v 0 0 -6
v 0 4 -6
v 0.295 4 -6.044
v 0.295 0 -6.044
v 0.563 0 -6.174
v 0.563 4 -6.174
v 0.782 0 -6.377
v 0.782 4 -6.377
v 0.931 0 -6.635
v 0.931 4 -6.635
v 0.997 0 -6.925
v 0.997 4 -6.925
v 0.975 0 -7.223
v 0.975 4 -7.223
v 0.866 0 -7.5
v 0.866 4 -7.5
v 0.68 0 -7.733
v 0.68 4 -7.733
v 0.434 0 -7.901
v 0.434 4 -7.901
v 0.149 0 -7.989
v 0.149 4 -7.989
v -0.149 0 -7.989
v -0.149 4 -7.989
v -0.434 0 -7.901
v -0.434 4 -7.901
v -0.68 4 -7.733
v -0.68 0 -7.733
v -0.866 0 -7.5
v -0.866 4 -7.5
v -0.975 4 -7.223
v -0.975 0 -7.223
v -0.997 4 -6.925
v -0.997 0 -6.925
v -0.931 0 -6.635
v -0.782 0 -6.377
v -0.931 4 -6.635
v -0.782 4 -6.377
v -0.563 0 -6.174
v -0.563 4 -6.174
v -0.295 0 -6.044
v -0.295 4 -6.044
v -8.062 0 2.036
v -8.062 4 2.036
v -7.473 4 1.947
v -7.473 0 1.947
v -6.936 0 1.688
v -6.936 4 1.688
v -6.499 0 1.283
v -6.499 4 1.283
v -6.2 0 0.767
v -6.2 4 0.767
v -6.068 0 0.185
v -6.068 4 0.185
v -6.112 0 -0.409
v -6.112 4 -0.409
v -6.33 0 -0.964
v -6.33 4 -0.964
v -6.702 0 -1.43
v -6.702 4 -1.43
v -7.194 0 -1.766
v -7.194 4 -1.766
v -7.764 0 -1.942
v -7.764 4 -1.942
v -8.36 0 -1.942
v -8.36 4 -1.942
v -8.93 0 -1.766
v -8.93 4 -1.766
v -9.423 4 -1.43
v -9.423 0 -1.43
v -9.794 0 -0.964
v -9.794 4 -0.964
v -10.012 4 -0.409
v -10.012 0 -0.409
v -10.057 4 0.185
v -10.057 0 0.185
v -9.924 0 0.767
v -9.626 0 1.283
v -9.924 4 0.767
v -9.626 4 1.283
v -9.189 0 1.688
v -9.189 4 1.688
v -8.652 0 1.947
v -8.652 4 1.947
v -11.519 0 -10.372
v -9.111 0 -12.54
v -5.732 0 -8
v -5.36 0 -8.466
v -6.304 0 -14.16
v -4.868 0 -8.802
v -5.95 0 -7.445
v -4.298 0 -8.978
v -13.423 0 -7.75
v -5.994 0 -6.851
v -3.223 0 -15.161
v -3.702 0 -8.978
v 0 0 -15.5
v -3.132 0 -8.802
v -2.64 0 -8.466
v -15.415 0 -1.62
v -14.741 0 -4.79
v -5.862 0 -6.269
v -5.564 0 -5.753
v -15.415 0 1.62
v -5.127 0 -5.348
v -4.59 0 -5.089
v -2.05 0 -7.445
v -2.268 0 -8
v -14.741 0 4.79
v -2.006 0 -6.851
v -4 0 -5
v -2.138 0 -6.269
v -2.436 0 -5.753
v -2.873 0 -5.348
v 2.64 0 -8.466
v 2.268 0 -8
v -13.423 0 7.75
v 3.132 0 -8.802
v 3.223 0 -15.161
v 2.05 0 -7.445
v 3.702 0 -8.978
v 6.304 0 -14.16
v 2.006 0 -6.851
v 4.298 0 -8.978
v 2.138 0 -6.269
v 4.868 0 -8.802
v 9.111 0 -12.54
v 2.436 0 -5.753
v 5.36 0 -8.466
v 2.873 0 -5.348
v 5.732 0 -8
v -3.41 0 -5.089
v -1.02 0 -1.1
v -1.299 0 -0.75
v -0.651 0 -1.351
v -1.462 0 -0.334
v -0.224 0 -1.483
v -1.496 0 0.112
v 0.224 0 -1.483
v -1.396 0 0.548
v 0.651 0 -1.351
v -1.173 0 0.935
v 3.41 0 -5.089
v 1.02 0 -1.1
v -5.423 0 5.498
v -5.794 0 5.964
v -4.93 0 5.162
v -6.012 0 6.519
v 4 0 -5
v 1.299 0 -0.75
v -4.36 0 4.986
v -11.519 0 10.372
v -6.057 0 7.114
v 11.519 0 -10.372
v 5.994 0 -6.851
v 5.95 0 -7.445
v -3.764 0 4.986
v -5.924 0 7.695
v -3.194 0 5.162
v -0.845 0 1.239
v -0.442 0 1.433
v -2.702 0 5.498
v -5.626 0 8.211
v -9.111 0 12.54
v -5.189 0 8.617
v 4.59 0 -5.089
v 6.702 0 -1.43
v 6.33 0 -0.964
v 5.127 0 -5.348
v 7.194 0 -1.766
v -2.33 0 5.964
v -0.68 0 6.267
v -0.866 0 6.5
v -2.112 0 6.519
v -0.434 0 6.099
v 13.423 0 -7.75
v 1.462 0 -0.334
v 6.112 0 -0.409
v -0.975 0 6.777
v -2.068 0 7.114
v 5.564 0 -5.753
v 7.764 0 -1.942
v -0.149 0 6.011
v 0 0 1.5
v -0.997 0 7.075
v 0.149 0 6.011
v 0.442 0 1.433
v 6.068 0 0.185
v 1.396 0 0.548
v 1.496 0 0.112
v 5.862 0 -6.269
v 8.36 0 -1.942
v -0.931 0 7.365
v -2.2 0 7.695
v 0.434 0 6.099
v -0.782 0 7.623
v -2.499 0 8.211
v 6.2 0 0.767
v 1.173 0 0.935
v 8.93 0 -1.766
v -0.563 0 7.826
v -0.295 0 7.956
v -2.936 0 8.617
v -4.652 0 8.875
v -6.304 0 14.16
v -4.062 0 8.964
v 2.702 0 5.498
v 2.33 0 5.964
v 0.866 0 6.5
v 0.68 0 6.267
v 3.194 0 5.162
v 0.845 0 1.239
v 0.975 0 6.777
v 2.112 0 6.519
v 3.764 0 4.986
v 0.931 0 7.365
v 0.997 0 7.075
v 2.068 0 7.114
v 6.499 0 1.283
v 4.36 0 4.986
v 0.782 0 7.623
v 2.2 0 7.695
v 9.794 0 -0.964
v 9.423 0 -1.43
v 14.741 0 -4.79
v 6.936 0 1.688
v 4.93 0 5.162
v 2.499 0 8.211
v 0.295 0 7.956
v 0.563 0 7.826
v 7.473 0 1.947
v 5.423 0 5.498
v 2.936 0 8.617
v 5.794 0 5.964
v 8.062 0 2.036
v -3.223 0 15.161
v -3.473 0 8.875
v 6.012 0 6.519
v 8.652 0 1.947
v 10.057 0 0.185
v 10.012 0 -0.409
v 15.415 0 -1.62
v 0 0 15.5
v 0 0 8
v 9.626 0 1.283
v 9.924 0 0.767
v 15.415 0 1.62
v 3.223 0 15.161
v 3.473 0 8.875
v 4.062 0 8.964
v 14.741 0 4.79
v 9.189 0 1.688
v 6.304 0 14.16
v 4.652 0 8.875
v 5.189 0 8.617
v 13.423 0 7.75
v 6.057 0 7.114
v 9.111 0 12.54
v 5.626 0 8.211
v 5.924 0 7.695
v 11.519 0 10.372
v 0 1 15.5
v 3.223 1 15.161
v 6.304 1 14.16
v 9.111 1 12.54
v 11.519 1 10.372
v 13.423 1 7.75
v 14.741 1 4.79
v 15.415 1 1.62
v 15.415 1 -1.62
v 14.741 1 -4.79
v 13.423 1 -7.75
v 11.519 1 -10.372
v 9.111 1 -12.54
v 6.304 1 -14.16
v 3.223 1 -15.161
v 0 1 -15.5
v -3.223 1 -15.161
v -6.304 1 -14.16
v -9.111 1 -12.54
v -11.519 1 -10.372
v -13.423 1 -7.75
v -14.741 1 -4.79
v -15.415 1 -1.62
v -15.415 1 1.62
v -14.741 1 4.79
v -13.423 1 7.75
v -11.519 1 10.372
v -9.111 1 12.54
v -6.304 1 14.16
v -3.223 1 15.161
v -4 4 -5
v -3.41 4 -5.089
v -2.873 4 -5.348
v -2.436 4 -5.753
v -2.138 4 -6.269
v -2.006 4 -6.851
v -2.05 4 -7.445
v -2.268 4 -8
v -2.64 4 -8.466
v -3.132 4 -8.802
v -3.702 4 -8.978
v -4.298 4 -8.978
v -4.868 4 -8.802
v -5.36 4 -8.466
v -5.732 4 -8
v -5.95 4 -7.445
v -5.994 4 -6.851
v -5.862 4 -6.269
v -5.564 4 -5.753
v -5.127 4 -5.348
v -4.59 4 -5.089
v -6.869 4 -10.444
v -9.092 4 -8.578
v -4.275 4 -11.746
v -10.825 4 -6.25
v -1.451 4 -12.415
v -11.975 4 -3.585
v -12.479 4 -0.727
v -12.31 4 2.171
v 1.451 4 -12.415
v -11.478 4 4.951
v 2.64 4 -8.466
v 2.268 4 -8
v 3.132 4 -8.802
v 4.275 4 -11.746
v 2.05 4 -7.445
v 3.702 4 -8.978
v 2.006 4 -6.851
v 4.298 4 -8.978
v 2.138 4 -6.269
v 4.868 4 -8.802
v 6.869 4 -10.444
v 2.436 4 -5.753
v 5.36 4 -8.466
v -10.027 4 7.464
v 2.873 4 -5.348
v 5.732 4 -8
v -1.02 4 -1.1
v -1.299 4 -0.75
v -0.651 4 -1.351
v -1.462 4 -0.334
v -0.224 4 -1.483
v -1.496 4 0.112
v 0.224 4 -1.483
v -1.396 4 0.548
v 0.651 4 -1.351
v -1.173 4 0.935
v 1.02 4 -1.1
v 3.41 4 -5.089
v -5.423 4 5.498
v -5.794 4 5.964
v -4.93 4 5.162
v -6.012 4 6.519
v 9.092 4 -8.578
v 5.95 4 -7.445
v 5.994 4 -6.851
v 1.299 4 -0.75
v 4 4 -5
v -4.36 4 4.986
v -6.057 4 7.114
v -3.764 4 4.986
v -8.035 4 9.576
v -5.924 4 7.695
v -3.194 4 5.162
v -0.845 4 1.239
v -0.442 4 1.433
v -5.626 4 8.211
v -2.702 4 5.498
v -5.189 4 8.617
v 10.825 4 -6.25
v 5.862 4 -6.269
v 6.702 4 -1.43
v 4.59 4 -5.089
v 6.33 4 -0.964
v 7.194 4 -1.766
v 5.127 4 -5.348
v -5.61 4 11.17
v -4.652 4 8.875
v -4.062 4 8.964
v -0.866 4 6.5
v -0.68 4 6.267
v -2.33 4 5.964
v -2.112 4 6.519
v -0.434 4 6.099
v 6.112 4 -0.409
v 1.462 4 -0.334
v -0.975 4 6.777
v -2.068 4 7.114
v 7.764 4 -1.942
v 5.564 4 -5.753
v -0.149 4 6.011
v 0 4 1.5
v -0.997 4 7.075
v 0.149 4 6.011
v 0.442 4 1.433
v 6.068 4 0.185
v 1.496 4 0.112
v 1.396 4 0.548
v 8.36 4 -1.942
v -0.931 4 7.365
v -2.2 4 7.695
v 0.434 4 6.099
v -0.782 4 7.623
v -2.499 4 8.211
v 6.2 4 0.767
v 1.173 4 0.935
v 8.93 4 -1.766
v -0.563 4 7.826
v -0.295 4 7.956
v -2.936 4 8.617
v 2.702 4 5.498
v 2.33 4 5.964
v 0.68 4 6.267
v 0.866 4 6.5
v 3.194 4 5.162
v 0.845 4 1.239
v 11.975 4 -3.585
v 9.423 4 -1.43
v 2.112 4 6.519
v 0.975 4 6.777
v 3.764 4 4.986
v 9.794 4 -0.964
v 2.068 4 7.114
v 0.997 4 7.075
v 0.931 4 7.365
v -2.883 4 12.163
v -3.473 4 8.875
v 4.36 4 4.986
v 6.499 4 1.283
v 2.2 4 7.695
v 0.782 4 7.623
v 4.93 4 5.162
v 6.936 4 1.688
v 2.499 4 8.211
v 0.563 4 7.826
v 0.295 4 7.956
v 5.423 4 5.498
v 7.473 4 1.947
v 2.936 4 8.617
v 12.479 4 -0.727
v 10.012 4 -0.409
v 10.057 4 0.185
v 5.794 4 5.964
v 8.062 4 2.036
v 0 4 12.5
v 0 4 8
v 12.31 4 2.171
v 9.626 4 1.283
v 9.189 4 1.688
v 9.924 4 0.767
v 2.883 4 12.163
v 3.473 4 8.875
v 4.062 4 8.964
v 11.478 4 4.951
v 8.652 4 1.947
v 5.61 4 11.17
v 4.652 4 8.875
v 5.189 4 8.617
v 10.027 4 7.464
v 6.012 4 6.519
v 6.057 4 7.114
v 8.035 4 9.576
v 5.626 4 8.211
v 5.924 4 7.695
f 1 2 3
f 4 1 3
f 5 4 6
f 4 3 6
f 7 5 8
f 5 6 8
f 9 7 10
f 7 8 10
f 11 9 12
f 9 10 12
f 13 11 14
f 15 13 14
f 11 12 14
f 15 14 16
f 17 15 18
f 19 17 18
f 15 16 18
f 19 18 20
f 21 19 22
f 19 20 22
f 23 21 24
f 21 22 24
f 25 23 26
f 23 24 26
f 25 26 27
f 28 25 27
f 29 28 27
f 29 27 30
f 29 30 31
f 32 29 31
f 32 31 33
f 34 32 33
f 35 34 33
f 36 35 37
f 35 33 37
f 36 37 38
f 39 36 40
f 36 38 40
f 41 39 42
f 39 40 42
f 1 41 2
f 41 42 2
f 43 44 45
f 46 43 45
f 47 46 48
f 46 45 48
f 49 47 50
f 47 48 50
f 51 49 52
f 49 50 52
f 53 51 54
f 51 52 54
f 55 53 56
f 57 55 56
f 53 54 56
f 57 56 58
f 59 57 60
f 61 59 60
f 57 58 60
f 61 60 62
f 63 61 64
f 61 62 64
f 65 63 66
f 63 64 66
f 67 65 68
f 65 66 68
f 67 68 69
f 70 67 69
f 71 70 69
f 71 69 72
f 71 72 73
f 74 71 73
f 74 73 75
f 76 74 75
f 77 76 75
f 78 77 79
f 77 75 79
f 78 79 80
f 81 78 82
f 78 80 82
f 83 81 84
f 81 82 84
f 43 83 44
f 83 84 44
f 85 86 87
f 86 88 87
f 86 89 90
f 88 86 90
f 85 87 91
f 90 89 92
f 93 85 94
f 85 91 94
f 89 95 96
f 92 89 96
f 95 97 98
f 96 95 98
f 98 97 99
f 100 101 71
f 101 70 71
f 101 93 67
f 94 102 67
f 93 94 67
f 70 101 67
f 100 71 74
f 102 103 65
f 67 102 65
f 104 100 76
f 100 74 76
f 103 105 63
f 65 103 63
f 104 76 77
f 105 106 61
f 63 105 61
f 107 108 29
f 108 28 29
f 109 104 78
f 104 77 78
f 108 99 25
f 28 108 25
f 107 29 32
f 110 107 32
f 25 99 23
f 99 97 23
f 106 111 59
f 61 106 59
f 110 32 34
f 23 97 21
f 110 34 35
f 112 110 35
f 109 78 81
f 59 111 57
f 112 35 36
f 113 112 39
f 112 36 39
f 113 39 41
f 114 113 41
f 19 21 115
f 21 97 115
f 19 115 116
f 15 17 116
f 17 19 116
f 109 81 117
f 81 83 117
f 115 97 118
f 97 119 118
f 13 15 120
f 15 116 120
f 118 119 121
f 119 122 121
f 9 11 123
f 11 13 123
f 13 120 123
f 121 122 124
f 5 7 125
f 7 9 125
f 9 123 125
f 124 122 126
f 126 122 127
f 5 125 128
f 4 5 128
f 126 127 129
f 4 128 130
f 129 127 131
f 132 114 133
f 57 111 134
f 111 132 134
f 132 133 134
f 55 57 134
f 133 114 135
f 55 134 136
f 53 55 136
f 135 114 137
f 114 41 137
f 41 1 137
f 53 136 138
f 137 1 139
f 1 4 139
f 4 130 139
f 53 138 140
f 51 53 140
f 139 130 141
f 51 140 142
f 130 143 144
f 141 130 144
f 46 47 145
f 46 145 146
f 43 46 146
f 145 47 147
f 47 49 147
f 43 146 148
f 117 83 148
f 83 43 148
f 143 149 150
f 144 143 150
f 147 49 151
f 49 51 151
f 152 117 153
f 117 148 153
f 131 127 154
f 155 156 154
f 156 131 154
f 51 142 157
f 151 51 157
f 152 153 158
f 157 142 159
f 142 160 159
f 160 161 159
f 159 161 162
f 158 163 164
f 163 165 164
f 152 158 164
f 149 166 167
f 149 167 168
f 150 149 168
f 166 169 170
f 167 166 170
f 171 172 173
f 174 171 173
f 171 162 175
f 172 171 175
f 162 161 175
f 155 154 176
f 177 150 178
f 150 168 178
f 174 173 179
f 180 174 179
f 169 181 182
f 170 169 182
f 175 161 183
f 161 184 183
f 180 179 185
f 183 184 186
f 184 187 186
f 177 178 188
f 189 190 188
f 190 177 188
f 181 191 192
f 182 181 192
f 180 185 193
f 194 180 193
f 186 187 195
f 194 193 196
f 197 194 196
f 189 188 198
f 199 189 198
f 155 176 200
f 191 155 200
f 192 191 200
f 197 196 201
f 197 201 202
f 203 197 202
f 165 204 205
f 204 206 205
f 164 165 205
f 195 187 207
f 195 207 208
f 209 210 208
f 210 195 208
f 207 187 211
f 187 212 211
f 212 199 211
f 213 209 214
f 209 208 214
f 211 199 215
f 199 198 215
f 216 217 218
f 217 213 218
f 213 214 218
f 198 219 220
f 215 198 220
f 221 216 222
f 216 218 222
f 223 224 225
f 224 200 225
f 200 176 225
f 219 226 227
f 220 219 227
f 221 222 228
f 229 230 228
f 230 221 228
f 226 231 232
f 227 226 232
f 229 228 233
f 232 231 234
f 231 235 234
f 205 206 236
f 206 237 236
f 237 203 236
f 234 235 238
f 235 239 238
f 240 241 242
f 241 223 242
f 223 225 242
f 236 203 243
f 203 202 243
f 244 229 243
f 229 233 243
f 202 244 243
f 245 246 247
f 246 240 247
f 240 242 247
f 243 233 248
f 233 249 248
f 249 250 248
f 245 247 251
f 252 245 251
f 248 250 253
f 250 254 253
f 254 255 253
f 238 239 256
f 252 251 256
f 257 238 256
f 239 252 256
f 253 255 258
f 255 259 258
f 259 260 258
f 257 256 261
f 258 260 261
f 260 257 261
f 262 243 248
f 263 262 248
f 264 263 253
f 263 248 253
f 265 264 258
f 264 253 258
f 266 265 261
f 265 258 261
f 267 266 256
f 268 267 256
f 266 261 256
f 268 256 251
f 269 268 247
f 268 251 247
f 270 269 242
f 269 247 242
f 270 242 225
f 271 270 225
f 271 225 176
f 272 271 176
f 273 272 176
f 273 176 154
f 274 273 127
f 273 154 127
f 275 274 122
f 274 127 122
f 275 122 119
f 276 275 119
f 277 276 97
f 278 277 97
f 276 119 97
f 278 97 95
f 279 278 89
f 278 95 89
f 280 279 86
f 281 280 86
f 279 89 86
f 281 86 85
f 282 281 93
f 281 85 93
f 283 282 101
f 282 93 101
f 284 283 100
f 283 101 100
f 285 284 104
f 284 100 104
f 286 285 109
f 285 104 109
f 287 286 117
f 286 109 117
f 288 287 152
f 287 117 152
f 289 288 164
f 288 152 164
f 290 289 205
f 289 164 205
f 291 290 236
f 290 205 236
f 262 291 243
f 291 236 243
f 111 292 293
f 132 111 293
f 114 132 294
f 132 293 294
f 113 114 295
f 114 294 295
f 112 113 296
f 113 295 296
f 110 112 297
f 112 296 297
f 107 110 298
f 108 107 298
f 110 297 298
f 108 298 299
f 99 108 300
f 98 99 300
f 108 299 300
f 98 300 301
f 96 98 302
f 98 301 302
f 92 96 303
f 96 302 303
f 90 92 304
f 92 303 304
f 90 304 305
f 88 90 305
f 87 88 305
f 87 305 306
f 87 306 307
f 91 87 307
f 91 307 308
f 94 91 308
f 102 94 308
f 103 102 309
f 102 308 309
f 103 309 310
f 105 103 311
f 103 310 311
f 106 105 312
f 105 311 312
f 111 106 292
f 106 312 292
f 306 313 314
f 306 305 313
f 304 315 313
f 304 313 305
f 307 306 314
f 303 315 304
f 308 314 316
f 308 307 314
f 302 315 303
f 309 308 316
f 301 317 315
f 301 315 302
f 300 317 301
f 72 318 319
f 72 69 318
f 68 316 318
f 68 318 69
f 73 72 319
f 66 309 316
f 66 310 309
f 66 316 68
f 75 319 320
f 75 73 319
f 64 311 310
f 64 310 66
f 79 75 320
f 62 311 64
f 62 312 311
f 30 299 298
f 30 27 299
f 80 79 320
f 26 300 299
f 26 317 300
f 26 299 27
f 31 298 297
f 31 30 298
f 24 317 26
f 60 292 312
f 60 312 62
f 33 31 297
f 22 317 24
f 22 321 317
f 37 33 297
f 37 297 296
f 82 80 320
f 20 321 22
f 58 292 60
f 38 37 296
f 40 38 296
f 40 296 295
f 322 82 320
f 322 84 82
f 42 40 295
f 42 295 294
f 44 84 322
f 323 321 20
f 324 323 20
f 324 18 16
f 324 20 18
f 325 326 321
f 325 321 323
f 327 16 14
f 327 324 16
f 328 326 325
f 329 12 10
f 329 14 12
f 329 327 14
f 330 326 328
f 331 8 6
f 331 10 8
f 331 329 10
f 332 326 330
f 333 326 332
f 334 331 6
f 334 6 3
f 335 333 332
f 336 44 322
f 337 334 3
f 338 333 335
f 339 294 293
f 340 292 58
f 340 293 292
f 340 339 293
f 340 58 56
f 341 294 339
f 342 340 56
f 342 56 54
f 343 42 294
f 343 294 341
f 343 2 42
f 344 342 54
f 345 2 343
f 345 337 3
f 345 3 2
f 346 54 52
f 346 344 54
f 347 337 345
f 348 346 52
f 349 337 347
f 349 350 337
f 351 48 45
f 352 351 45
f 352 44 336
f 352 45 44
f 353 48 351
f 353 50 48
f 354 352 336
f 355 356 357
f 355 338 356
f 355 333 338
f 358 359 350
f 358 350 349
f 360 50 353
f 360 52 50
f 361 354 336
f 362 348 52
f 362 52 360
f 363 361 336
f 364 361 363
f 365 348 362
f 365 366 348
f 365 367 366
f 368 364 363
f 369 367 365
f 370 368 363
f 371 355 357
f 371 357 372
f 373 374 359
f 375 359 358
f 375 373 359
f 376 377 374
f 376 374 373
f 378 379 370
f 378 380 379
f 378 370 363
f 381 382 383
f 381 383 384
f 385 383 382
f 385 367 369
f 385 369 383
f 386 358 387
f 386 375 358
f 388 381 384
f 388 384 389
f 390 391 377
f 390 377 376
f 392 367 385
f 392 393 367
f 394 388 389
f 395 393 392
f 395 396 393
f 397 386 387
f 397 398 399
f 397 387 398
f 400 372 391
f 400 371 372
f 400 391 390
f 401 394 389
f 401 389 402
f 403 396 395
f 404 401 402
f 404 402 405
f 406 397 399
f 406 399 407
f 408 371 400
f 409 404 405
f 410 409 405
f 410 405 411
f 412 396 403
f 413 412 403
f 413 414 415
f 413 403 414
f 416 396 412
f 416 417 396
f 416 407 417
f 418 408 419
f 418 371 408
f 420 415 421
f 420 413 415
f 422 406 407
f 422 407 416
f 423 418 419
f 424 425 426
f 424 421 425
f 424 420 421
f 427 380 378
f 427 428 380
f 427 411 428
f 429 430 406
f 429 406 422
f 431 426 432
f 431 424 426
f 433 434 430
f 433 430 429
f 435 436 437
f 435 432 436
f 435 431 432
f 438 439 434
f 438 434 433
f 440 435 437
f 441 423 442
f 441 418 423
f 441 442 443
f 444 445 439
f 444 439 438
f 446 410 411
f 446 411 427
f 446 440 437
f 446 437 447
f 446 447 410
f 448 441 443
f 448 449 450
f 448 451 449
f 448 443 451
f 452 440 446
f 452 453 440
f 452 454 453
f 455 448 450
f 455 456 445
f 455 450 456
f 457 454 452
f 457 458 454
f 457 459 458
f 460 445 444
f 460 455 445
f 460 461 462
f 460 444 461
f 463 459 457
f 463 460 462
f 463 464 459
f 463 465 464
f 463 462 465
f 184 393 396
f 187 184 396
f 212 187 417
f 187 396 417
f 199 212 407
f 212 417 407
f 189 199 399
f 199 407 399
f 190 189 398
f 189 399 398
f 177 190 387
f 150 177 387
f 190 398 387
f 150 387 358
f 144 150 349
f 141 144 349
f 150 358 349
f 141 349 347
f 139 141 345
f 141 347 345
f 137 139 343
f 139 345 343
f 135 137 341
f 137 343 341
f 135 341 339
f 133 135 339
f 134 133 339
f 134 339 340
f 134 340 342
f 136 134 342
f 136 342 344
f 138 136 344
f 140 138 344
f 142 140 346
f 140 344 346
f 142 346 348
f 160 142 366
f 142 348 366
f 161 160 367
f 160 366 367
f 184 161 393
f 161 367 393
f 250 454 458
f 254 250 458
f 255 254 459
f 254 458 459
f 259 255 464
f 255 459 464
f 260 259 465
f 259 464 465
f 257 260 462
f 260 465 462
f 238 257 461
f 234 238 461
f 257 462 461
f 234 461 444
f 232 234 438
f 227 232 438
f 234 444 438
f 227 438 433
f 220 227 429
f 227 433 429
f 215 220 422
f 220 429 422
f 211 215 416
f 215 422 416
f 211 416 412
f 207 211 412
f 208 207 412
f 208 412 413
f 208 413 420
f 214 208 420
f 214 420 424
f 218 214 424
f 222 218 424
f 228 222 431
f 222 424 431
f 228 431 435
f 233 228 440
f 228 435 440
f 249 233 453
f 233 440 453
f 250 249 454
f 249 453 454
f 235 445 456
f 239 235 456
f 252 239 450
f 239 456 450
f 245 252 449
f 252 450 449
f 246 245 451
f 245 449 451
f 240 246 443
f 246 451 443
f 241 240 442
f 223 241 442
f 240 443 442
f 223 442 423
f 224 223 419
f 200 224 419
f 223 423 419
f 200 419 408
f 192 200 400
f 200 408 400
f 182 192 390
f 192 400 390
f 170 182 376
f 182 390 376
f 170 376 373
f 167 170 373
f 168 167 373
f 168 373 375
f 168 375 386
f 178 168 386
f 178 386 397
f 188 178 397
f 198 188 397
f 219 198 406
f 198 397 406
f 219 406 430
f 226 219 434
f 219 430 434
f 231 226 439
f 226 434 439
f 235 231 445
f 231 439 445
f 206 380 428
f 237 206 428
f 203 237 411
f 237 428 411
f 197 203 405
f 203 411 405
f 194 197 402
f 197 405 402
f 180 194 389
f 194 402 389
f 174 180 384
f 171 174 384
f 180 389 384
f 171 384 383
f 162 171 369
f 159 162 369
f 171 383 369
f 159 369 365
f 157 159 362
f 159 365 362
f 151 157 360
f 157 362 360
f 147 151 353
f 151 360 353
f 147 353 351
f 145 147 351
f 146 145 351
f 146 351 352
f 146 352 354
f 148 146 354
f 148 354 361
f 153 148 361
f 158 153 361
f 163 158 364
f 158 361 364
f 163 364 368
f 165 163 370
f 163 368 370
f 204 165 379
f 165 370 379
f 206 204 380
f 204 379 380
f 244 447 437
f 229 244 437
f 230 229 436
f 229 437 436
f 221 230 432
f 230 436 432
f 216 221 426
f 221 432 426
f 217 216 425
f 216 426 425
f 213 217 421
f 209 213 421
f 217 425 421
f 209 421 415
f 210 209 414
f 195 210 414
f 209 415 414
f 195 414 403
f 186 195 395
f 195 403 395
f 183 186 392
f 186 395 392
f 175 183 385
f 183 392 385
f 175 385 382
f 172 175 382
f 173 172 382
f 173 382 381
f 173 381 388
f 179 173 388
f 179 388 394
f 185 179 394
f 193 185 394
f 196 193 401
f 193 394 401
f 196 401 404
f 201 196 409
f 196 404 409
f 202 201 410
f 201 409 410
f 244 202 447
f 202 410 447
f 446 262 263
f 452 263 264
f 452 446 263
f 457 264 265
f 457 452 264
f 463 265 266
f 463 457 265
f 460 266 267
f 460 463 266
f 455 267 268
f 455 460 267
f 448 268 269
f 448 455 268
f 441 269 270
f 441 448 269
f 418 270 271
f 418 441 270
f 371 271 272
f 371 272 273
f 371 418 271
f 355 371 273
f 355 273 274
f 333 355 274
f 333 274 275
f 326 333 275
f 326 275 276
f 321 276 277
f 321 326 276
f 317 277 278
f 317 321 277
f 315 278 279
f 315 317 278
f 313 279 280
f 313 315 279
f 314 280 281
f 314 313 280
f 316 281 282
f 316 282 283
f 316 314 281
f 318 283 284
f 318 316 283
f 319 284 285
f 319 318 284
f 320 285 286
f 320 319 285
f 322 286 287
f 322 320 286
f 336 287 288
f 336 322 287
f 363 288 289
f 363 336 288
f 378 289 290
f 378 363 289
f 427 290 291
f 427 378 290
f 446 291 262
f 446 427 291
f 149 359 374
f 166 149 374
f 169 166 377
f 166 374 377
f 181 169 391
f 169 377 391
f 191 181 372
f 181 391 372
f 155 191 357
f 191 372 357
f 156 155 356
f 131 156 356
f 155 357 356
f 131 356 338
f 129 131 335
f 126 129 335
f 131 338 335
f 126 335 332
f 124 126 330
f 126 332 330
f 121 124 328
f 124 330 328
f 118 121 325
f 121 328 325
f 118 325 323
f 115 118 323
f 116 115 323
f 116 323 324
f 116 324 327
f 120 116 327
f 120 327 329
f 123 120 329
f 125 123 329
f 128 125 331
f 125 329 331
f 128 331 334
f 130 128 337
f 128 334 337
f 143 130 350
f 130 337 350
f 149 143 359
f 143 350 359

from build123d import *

# Parameters (mm, degrees)
SKETCH1_R           = 15.5
BOSS_EXTRUDE1_DEPTH = 4
CHAMFER1_SIZE       = 3
SKETCH2_R           = 2
CUT_EXTRUDE1_DEPTH  = 4
SKETCH3_R           = 1.5
CUT_EXTRUDE2_DEPTH  = 4
SKETCH4_R           = 1
CUT_EXTRUDE3_DEPTH  = 4


with BuildPart() as part:
    # Sketch1 → Boss-Extrude1 (new body)
    with BuildSketch(Plane(origin=(0, 0, 0), x_dir=(1, 0, 0), z_dir=(0, 1, 0))):
        with Locations(Location((0, 0, 0), (0, 0, 270))):
            Circle(SKETCH1_R)
    extrude(amount=BOSS_EXTRUDE1_DEPTH)

    # Chamfer1
    chamfer1_edges = [part.edges().sort_by_distance(p)[0] for p in [
        (0, 4, -15.5),
    ]]
    chamfer(chamfer1_edges, length=CHAMFER1_SIZE)

    # Sketch2 → Cut-Extrude1 (cut)
    with BuildSketch(Plane(origin=(0, 4, 0), x_dir=(1, 0, 0), z_dir=(0, 1, 0))):
        with Locations(Location((4, 7, 0), (0, 0, 270))):
            Circle(SKETCH2_R)
        with Locations(Location((-4, 7, 0), (0, 0, 270))):
            Circle(SKETCH2_R)
        with Locations(Location((8.062177826, -0.035898385, 0), (0, 0, 270))):
            Circle(SKETCH2_R)
        with Locations(Location((4.062177826, -6.964101615, 0), (0, 0, 270))):
            Circle(SKETCH2_R)
        with Locations(Location((-4.062177826, -6.964101615, 0), (0, 0, 270))):
            Circle(SKETCH2_R)
        with Locations(Location((-8.062177826, -0.035898385, 0), (0, 0, 270))):
            Circle(SKETCH2_R)
    extrude(amount=-CUT_EXTRUDE1_DEPTH, mode=Mode.SUBTRACT)

    # Sketch3 → Cut-Extrude2 (cut)
    with BuildSketch(Plane(origin=(0, 4, 0), x_dir=(1, 0, 0), z_dir=(0, 1, 0))):
        with Locations(Location((0, 0, 0), (0, 0, 270))):
            Circle(SKETCH3_R)
    extrude(amount=-CUT_EXTRUDE2_DEPTH, mode=Mode.SUBTRACT)

    # Sketch4 → Cut-Extrude3 (cut)
    with BuildSketch(Plane(origin=(0, 4, 0), x_dir=(1, 0, 0), z_dir=(0, 1, 0))):
        with Locations(Location((0, 7, 0), (0, 0, 270))):
            Circle(SKETCH4_R)
        with Locations(Location((0, -7, 0), (0, 0, 270))):
            Circle(SKETCH4_R)
    extrude(amount=-CUT_EXTRUDE3_DEPTH, mode=Mode.SUBTRACT)


solid = part.part
